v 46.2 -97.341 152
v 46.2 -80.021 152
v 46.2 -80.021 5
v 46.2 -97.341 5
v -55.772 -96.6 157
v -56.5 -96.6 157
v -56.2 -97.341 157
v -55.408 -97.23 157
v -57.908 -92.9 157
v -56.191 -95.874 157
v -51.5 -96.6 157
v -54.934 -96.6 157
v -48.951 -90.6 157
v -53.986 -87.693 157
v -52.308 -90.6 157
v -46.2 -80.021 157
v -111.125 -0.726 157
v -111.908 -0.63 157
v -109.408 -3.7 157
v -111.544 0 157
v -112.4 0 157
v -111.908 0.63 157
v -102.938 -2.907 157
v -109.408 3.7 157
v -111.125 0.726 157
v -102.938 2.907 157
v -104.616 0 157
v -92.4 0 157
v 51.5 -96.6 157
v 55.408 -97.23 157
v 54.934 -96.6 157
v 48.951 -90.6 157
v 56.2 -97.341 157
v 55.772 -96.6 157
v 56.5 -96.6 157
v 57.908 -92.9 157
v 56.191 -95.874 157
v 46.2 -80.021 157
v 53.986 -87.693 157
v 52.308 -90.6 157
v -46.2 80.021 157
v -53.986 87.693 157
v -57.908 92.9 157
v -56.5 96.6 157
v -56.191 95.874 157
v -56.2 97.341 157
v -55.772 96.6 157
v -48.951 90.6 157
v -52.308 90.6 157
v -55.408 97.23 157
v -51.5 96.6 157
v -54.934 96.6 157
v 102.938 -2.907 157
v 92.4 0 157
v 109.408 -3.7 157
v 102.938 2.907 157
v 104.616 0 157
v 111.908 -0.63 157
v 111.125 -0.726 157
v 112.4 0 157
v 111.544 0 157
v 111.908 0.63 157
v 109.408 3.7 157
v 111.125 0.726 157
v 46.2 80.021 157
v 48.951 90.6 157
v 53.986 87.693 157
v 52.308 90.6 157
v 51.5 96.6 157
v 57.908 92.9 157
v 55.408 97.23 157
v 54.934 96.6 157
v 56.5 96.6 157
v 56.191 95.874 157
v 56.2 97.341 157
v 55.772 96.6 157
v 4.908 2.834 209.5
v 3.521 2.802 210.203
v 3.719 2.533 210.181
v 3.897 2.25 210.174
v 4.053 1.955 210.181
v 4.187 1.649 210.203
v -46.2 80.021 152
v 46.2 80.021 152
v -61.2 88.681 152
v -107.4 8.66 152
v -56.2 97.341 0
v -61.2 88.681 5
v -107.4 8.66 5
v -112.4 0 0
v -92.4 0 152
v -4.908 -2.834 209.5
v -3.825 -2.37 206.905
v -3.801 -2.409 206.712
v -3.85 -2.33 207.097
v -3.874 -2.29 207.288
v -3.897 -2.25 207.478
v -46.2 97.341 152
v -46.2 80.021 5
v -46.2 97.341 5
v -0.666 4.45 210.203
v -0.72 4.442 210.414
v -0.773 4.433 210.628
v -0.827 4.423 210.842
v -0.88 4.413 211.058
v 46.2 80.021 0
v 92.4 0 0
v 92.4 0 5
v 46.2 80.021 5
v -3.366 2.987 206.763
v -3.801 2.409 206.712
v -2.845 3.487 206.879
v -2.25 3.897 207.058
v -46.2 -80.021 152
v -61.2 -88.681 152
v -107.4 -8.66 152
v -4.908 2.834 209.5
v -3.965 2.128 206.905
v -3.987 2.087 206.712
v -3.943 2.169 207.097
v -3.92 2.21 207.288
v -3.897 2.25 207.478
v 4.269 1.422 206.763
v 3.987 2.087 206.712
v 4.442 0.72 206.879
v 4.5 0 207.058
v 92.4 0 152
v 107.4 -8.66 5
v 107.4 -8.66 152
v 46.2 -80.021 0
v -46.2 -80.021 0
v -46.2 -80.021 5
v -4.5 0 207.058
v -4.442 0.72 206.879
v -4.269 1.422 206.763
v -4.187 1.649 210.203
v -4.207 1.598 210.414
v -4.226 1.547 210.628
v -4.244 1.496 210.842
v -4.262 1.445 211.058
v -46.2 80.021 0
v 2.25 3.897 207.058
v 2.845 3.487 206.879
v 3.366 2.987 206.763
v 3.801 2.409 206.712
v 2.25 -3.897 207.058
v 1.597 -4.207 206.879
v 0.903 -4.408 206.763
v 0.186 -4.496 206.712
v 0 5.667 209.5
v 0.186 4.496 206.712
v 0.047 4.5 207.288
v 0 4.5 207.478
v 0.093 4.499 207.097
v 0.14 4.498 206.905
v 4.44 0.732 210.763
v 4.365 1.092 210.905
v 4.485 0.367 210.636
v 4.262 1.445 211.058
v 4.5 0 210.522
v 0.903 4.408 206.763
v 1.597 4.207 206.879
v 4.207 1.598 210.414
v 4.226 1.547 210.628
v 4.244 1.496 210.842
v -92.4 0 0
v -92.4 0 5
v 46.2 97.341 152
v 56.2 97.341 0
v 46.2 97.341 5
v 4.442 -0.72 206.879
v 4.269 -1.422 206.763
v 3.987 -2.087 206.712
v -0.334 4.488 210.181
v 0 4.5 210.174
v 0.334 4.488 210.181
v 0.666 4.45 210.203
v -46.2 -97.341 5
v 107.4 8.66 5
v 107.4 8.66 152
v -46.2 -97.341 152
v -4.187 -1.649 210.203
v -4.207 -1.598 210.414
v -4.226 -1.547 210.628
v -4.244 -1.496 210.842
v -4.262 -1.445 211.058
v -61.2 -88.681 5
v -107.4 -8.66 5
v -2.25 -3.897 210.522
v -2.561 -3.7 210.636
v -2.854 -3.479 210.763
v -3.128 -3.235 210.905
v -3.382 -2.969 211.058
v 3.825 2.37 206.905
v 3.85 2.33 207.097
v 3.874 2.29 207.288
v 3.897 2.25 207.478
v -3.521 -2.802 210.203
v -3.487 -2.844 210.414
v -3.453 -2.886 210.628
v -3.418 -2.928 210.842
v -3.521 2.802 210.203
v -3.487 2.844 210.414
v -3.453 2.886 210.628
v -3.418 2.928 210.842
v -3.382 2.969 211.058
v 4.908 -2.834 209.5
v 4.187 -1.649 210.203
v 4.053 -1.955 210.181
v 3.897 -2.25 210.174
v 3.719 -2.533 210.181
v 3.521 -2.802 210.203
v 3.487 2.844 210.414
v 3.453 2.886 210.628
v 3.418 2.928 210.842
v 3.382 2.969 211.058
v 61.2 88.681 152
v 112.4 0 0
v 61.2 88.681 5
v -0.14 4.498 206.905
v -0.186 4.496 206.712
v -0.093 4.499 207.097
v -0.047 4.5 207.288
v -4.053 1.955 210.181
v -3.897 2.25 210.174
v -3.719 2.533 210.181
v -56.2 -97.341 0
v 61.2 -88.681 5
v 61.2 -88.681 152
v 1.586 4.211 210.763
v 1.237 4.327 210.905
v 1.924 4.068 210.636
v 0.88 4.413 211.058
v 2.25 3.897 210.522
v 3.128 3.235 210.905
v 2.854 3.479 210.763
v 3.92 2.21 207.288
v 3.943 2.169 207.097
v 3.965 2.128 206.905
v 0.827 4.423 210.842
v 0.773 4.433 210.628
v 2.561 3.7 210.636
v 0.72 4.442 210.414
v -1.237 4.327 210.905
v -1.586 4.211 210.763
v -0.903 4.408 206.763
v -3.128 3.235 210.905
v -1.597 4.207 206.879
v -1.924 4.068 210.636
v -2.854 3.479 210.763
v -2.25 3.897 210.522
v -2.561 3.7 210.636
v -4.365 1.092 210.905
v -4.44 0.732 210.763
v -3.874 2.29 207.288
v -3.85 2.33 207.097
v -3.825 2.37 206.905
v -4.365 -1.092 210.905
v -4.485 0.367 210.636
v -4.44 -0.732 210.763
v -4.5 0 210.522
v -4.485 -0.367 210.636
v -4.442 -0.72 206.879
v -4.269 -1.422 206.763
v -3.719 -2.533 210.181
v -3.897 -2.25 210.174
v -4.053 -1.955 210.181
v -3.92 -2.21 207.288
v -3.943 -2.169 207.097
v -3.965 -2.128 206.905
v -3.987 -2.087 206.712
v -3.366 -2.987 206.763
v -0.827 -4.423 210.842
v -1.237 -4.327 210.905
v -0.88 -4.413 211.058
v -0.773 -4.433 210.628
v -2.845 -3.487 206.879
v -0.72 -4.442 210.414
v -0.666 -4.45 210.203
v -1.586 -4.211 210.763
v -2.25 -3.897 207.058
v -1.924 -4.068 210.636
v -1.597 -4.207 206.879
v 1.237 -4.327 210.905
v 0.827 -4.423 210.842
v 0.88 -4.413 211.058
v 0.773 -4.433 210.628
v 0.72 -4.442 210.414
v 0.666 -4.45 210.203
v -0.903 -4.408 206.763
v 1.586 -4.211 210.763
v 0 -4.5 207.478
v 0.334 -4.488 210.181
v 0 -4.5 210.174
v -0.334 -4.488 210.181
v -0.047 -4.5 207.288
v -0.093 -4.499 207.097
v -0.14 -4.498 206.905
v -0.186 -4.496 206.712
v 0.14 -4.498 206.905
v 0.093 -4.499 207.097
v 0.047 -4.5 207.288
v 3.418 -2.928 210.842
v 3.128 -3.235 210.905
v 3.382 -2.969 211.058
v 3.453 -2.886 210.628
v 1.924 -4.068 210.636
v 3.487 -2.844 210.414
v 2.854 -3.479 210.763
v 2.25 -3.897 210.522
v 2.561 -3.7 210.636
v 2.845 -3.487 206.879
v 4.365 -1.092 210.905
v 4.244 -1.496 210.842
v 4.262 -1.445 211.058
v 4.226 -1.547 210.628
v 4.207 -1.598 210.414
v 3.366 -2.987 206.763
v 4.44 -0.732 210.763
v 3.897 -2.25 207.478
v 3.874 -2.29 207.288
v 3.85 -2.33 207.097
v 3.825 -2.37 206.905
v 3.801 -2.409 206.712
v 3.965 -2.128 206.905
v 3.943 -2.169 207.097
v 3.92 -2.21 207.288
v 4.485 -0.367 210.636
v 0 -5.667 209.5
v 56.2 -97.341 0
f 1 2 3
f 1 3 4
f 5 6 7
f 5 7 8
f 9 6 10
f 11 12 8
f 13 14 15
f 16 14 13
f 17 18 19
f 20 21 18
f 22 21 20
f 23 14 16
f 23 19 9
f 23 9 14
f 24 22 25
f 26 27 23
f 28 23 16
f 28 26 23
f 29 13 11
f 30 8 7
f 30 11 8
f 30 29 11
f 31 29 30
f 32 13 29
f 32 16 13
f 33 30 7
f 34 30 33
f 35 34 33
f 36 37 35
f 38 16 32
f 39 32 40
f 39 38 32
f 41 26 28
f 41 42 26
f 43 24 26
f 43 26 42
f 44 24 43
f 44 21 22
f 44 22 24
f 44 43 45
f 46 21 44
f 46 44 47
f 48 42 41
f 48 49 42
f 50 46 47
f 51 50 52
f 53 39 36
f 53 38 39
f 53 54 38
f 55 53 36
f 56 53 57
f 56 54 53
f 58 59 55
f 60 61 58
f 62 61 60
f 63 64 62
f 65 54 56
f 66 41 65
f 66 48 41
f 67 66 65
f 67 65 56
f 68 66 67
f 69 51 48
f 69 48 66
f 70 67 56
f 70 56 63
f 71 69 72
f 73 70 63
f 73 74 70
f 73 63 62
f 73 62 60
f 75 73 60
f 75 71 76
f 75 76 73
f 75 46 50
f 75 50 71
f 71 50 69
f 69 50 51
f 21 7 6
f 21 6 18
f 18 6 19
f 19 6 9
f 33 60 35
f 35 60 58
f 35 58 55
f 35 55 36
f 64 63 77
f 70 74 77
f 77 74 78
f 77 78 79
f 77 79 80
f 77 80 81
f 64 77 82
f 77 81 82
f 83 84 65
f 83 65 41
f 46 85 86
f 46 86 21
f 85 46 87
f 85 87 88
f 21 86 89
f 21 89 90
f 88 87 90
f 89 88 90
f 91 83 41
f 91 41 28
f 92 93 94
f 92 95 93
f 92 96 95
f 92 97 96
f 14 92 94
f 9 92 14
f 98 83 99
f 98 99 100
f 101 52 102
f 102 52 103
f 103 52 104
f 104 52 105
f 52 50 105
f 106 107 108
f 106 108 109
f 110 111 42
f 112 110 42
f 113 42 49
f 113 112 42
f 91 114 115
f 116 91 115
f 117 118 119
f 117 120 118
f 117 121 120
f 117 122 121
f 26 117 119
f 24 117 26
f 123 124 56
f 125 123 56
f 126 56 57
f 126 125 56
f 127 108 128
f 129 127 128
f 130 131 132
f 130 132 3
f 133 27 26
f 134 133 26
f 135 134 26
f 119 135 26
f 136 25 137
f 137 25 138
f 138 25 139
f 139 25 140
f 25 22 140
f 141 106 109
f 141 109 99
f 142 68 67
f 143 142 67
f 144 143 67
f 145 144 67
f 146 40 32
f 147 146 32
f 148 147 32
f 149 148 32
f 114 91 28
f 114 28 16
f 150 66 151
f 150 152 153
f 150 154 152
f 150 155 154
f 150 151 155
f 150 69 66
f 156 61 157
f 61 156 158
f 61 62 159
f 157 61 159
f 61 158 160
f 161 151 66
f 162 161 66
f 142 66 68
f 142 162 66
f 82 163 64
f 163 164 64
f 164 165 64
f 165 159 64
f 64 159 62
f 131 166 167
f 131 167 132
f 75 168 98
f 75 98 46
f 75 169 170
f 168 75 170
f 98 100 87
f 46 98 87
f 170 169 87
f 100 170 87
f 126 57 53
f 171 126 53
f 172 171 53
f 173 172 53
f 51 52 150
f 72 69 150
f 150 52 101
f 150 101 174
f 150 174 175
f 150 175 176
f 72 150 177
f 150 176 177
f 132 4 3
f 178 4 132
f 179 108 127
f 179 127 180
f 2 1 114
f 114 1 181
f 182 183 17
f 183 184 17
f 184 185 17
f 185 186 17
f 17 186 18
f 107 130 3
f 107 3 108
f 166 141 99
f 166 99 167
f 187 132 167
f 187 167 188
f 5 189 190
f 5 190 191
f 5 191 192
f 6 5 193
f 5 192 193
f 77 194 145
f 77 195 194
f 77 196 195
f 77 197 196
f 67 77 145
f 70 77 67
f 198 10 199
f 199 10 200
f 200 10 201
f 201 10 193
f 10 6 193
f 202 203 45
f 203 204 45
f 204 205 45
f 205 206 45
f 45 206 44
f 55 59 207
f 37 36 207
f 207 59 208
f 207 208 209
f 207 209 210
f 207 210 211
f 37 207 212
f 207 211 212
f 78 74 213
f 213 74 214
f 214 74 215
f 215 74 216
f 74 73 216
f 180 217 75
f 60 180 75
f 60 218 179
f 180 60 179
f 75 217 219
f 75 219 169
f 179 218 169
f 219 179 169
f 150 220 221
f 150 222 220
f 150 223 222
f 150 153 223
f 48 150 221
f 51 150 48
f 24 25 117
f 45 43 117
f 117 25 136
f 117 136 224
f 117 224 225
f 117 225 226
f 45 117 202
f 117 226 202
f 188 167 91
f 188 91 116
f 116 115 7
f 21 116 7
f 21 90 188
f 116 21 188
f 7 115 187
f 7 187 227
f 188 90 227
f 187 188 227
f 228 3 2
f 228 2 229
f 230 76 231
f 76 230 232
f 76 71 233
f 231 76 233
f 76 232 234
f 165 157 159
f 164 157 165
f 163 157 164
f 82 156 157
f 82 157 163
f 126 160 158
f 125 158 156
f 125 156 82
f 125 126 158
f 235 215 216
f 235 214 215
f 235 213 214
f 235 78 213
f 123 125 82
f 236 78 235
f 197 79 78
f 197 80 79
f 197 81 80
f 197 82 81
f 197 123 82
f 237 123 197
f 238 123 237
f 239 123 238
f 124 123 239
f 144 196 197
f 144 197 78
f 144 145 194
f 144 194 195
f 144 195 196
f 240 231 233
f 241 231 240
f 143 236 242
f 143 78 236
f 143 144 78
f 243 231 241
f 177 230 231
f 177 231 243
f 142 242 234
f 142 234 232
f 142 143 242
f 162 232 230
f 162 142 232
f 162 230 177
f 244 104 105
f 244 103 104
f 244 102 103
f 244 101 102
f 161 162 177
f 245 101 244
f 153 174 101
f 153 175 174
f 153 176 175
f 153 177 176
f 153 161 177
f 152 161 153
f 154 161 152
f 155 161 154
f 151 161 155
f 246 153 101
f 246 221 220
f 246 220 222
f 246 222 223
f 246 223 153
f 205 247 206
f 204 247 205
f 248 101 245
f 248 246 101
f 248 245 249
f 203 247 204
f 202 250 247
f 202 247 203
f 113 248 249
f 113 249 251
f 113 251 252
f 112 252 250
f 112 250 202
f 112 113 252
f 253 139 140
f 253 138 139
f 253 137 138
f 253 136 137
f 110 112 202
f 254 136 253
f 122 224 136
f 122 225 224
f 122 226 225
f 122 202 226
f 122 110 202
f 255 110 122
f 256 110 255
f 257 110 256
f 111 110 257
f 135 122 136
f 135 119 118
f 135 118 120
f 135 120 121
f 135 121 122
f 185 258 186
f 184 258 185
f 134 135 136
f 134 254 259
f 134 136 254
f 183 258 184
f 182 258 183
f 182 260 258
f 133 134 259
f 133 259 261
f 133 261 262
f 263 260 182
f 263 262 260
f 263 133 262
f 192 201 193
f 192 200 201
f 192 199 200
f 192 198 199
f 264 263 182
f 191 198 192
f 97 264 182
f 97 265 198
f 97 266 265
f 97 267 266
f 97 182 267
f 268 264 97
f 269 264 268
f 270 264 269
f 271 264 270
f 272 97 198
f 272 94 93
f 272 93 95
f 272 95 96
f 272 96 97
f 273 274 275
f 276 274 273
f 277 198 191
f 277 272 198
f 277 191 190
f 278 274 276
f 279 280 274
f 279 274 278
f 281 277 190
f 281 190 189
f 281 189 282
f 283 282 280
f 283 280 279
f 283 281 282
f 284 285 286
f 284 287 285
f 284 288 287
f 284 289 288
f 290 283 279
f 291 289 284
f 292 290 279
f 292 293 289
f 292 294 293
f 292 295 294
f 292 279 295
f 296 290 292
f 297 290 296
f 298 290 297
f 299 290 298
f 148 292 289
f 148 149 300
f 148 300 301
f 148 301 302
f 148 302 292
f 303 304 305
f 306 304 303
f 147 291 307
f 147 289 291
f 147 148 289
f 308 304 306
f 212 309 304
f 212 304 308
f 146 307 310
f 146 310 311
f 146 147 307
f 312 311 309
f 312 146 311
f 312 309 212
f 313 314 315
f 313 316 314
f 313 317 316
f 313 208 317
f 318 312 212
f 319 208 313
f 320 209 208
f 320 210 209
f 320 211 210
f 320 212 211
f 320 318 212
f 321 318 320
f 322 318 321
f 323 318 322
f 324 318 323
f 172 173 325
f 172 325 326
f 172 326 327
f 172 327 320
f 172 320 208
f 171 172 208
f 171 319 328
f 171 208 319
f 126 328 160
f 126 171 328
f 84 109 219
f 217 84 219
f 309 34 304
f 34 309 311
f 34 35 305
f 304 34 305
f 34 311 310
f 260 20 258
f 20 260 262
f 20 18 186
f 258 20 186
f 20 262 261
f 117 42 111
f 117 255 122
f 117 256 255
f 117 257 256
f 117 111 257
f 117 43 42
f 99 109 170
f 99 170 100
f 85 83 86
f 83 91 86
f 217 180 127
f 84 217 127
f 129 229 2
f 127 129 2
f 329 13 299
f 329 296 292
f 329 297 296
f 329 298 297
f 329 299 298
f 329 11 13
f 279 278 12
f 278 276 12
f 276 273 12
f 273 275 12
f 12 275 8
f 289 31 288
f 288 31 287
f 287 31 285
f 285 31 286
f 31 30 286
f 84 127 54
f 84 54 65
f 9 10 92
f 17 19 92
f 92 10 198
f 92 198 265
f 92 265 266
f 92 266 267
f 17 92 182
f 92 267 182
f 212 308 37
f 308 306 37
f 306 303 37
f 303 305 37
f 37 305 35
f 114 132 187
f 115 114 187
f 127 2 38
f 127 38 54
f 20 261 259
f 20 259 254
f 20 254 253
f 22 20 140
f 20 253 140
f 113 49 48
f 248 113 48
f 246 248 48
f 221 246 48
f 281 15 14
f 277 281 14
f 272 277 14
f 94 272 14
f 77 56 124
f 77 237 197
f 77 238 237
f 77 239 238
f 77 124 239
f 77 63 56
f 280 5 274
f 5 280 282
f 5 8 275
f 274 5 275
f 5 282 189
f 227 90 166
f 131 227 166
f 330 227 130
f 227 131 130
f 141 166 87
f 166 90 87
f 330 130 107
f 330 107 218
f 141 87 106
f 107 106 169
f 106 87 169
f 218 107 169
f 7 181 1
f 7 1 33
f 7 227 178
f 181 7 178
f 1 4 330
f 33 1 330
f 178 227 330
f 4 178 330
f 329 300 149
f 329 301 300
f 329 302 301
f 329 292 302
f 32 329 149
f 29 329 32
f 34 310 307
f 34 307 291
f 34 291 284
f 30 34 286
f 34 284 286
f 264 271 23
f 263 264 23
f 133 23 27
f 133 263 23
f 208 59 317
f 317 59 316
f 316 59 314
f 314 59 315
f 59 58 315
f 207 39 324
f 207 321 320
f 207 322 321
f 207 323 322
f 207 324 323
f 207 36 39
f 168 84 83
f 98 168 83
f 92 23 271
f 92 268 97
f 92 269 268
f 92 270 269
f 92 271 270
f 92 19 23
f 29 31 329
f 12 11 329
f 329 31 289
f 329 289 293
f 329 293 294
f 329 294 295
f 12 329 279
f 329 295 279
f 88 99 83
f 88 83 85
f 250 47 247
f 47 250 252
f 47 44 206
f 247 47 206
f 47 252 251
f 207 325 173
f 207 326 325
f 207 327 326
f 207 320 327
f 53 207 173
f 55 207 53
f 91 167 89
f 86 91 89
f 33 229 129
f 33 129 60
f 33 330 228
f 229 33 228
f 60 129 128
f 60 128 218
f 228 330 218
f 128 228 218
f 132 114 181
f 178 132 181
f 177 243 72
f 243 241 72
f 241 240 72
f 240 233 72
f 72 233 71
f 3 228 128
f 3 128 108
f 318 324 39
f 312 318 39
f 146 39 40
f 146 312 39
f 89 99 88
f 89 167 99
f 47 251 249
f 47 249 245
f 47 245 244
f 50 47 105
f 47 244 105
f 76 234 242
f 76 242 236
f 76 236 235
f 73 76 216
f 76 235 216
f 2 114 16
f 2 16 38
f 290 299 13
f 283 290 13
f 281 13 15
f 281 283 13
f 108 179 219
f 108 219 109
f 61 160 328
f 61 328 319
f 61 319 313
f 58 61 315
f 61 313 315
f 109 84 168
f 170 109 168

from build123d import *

# Parameters (mm, degrees)
CYLINDER_R                  = 4.5
CYLINDER_DEPTH              = 1000
PAD004_DEPTH                = 3
BODY004_PLACEMENT_ANGLE     = 60
PAD003_DEPTH                = 3
BODY003_PLACEMENT_ANGLE     = 60
PAD006_DEPTH                = 3
BODY006_PLACEMENT_ANGLE     = 60
PAD005_DEPTH                = 3
BODY005_PLACEMENT_ANGLE     = 60
CUT003_PLACEMENT_ANGLE      = 60
PAD008_DEPTH                = 3
BODY008_PLACEMENT_ANGLE     = 60
PAD007_DEPTH                = 3
BODY007_PLACEMENT_ANGLE     = 60
CUT004_PLACEMENT_ANGLE      = 120
PAD010_DEPTH                = 3
BODY010_PLACEMENT_ANGLE     = 60
PAD009_DEPTH                = 3
BODY009_PLACEMENT_ANGLE     = 60
CUT005_PLACEMENT_ANGLE      = 180
PAD012_DEPTH                = 3
BODY012_PLACEMENT_ANGLE     = 60
PAD011_DEPTH                = 3
BODY011_PLACEMENT_ANGLE     = 60
CUT006_PLACEMENT_ANGLE      = 240
PAD014_DEPTH                = 3
BODY014_PLACEMENT_ANGLE     = 60
PAD013_DEPTH                = 3
BODY013_PLACEMENT_ANGLE     = 60
CUT007_PLACEMENT_ANGLE      = 300
BOX_W                       = 92.4
BOX_H                       = 18
BOX_DEPTH                   = 147
BOX001_W                    = 92.4
BOX001_H                    = 18
BOX001_DEPTH                = 147
COMPOUND001_PLACEMENT_ANGLE = 60
BOX002_W                    = 92.4
BOX002_H                    = 18
BOX002_DEPTH                = 147
COMPOUND002_PLACEMENT_ANGLE = 120
BOX003_W                    = 92.4
BOX003_H                    = 18
BOX003_DEPTH                = 147
COMPOUND003_PLACEMENT_ANGLE = 180
BOX004_W                    = 92.4
BOX004_H                    = 18
BOX004_DEPTH                = 147
COMPOUND004_PLACEMENT_ANGLE = 240
BOX005_W                    = 92.4
BOX005_H                    = 18
BOX005_DEPTH                = 147
COMPOUND005_PLACEMENT_ANGLE = 300
PAD001_DEPTH                = 157
PAD_DEPTH                   = 157


with BuildPart() as cylinder:
    # Cylinder → Cylinder (new body)
    with BuildSketch(Plane.XY):
        Circle(CYLINDER_R)
    extrude(amount=CYLINDER_DEPTH)


with BuildPart() as compound007:
    # Sketch004 → Pad004 (new body)
    with BuildSketch(Plane.XZ):
        Polygon((-51.5, 0), (51.5, 0), (0, 105), align=None)
    extrude(amount=PAD004_DEPTH)


with BuildPart() as compound007_1:
    # Body004 placement: moved
    add(compound007.part.moved(Location((0, 96.6, 157))).rotate(Axis((0, 96.6, 157), (1, 0, 0)), BODY004_PLACEMENT_ANGLE))


with BuildPart() as cut002:
    # Sketch003 → Pad003 (new body)
    with BuildSketch(Plane.XZ):
        Polygon((-56.5, 0), (56.5, 0), (0, 115), align=None)
    extrude(amount=PAD003_DEPTH)


with BuildPart() as cut002_1:
    # Body003 placement: moved
    add(cut002.part.moved(Location((0, 96.6, 157))).rotate(Axis((0, 96.6, 157), (1, 0, 0)), BODY003_PLACEMENT_ANGLE))

    # Cut002: cut Compound007
    add(compound007_1.part, mode=Mode.SUBTRACT)


with BuildPart() as compound009:
    # Sketch006 → Pad006 (new body)
    with BuildSketch(Plane.XZ):
        Polygon((-51.5, 0), (51.5, 0), (0, 105), align=None)
    extrude(amount=PAD006_DEPTH)


with BuildPart() as compound009_1:
    # Body006 placement: moved
    add(compound009.part.moved(Location((0, 96.6, 157))).rotate(Axis((0, 96.6, 157), (1, 0, 0)), BODY006_PLACEMENT_ANGLE))


with BuildPart() as cut003:
    # Sketch005 → Pad005 (new body)
    with BuildSketch(Plane.XZ):
        Polygon((-56.5, 0), (56.5, 0), (0, 115), align=None)
    extrude(amount=PAD005_DEPTH)


with BuildPart() as cut003_1:
    # Body005 placement: moved
    add(cut003.part.moved(Location((0, 96.6, 157))).rotate(Axis((0, 96.6, 157), (1, 0, 0)), BODY005_PLACEMENT_ANGLE))

    # Cut003: cut Compound009
    add(compound009_1.part, mode=Mode.SUBTRACT)


with BuildPart() as cut003_2:
    # Cut003 placement: moved
    add(cut003_1.part.rotate(Axis((0, 0, 0), (0, 0, 1)), CUT003_PLACEMENT_ANGLE))


with BuildPart() as compound011:
    # Sketch008 → Pad008 (new body)
    with BuildSketch(Plane.XZ):
        Polygon((-51.5, 0), (51.5, 0), (0, 105), align=None)
    extrude(amount=PAD008_DEPTH)


with BuildPart() as compound011_1:
    # Body008 placement: moved
    add(compound011.part.moved(Location((0, 96.6, 157))).rotate(Axis((0, 96.6, 157), (1, 0, 0)), BODY008_PLACEMENT_ANGLE))


with BuildPart() as cut004:
    # Sketch007 → Pad007 (new body)
    with BuildSketch(Plane.XZ):
        Polygon((-56.5, 0), (56.5, 0), (0, 115), align=None)
    extrude(amount=PAD007_DEPTH)


with BuildPart() as cut004_1:
    # Body007 placement: moved
    add(cut004.part.moved(Location((0, 96.6, 157))).rotate(Axis((0, 96.6, 157), (1, 0, 0)), BODY007_PLACEMENT_ANGLE))

    # Cut004: cut Compound011
    add(compound011_1.part, mode=Mode.SUBTRACT)


with BuildPart() as cut004_2:
    # Cut004 placement: moved
    add(cut004_1.part.rotate(Axis((0, 0, 0), (0, 0, 1)), CUT004_PLACEMENT_ANGLE))


with BuildPart() as compound013:
    # Sketch010 → Pad010 (new body)
    with BuildSketch(Plane.XZ):
        Polygon((-51.5, 0), (51.5, 0), (0, 105), align=None)
    extrude(amount=PAD010_DEPTH)


with BuildPart() as compound013_1:
    # Body010 placement: moved
    add(compound013.part.moved(Location((0, 96.6, 157))).rotate(Axis((0, 96.6, 157), (1, 0, 0)), BODY010_PLACEMENT_ANGLE))


with BuildPart() as cut005:
    # Sketch009 → Pad009 (new body)
    with BuildSketch(Plane.XZ):
        Polygon((-56.5, 0), (56.5, 0), (0, 115), align=None)
    extrude(amount=PAD009_DEPTH)


with BuildPart() as cut005_1:
    # Body009 placement: moved
    add(cut005.part.moved(Location((0, 96.6, 157))).rotate(Axis((0, 96.6, 157), (1, 0, 0)), BODY009_PLACEMENT_ANGLE))

    # Cut005: cut Compound013
    add(compound013_1.part, mode=Mode.SUBTRACT)


with BuildPart() as cut005_2:
    # Cut005 placement: moved
    add(cut005_1.part.rotate(Axis((0, 0, 0), (0, 0, 1)), CUT005_PLACEMENT_ANGLE))


with BuildPart() as compound015:
    # Sketch012 → Pad012 (new body)
    with BuildSketch(Plane.XZ):
        Polygon((-51.5, 0), (51.5, 0), (0, 105), align=None)
    extrude(amount=PAD012_DEPTH)


with BuildPart() as compound015_1:
    # Body012 placement: moved
    add(compound015.part.moved(Location((0, 96.6, 157))).rotate(Axis((0, 96.6, 157), (1, 0, 0)), BODY012_PLACEMENT_ANGLE))


with BuildPart() as cut006:
    # Sketch011 → Pad011 (new body)
    with BuildSketch(Plane.XZ):
        Polygon((-56.5, 0), (56.5, 0), (0, 115), align=None)
    extrude(amount=PAD011_DEPTH)


with BuildPart() as cut006_1:
    # Body011 placement: moved
    add(cut006.part.moved(Location((0, 96.6, 157))).rotate(Axis((0, 96.6, 157), (1, 0, 0)), BODY011_PLACEMENT_ANGLE))

    # Cut006: cut Compound015
    add(compound015_1.part, mode=Mode.SUBTRACT)


with BuildPart() as cut006_2:
    # Cut006 placement: moved
    add(cut006_1.part.rotate(Axis((0, 0, 0), (0, 0, 1)), CUT006_PLACEMENT_ANGLE))


with BuildPart() as compound017:
    # Sketch014 → Pad014 (new body)
    with BuildSketch(Plane.XZ):
        Polygon((-51.5, 0), (51.5, 0), (0, 105), align=None)
    extrude(amount=PAD014_DEPTH)


with BuildPart() as compound017_1:
    # Body014 placement: moved
    add(compound017.part.moved(Location((0, 96.6, 157))).rotate(Axis((0, 96.6, 157), (1, 0, 0)), BODY014_PLACEMENT_ANGLE))


with BuildPart() as cut008:
    # Sketch013 → Pad013 (new body)
    with BuildSketch(Plane.XZ):
        Polygon((-56.5, 0), (56.5, 0), (0, 115), align=None)
    extrude(amount=PAD013_DEPTH)


with BuildPart() as cut008_1:
    # Body013 placement: moved
    add(cut008.part.moved(Location((0, 96.6, 157))).rotate(Axis((0, 96.6, 157), (1, 0, 0)), BODY013_PLACEMENT_ANGLE))

    # Cut007: cut Compound017
    add(compound017_1.part, mode=Mode.SUBTRACT)


with BuildPart() as cut008_2:
    # Cut007 placement: moved
    add(cut008_1.part.rotate(Axis((0, 0, 0), (0, 0, 1)), CUT007_PLACEMENT_ANGLE))

    # Fusion001: union Cut002, Cut003, Cut004, Cut005, Cut006
    add(cut002_1.part)
    add(cut003_2.part)
    add(cut004_2.part)
    add(cut005_2.part)
    add(cut006_2.part)

    # Cut008: cut Cylinder
    add(cylinder.part, mode=Mode.SUBTRACT)


with BuildPart() as compound:
    # Box → Box (new body)
    with BuildSketch(Plane(origin=(-46.2, 80, 5), x_dir=(1, 0, 0), z_dir=(0, 0, 1))):
        with Locations((46.2, 9)):
            Rectangle(BOX_W, BOX_H)
    extrude(amount=BOX_DEPTH)


with BuildPart() as compound001:
    # Box001 → Box001 (new body)
    with BuildSketch(Plane(origin=(-46.2, 80, 5), x_dir=(1, 0, 0), z_dir=(0, 0, 1))):
        with Locations((46.2, 9)):
            Rectangle(BOX001_W, BOX001_H)
    extrude(amount=BOX001_DEPTH)


with BuildPart() as compound001_1:
    # Compound001 placement: moved
    add(compound001.part.rotate(Axis((0, 0, 0), (0, 0, 1)), COMPOUND001_PLACEMENT_ANGLE))


with BuildPart() as compound002:
    # Box002 → Box002 (new body)
    with BuildSketch(Plane(origin=(-46.2, 80, 5), x_dir=(1, 0, 0), z_dir=(0, 0, 1))):
        with Locations((46.2, 9)):
            Rectangle(BOX002_W, BOX002_H)
    extrude(amount=BOX002_DEPTH)


with BuildPart() as compound002_1:
    # Compound002 placement: moved
    add(compound002.part.rotate(Axis((0, 0, 0), (0, 0, 1)), COMPOUND002_PLACEMENT_ANGLE))


with BuildPart() as compound003:
    # Box003 → Box003 (new body)
    with BuildSketch(Plane(origin=(-46.2, 80, 5), x_dir=(1, 0, 0), z_dir=(0, 0, 1))):
        with Locations((46.2, 9)):
            Rectangle(BOX003_W, BOX003_H)
    extrude(amount=BOX003_DEPTH)


with BuildPart() as compound003_1:
    # Compound003 placement: moved
    add(compound003.part.rotate(Axis((0, 0, 0), (0, 0, 1)), COMPOUND003_PLACEMENT_ANGLE))


with BuildPart() as compound004:
    # Box004 → Box004 (new body)
    with BuildSketch(Plane(origin=(-46.2, 80, 5), x_dir=(1, 0, 0), z_dir=(0, 0, 1))):
        with Locations((46.2, 9)):
            Rectangle(BOX004_W, BOX004_H)
    extrude(amount=BOX004_DEPTH)


with BuildPart() as compound004_1:
    # Compound004 placement: moved
    add(compound004.part.rotate(Axis((0, 0, 0), (0, 0, 1)), COMPOUND004_PLACEMENT_ANGLE))


with BuildPart() as fusion:
    # Box005 → Box005 (new body)
    with BuildSketch(Plane(origin=(-46.2, 80, 5), x_dir=(1, 0, 0), z_dir=(0, 0, 1))):
        with Locations((46.2, 9)):
            Rectangle(BOX005_W, BOX005_H)
    extrude(amount=BOX005_DEPTH)


with BuildPart() as fusion_1:
    # Compound005 placement: moved
    add(fusion.part.rotate(Axis((0, 0, 0), (0, 0, 1)), COMPOUND005_PLACEMENT_ANGLE))

    # Fusion: union Compound, Compound001, Compound002, Compound003, Compound004
    add(compound.part)
    add(compound001_1.part)
    add(compound002_1.part)
    add(compound003_1.part)
    add(compound004_1.part)


with BuildPart() as body001:
    # Sketch001 → Pad001 (new body)
    with BuildSketch(Plane.XY):
        Polygon((92.4, 0), (46.2, 80.020747), (-46.2, 80.020747), (-92.4, 0), (-46.2, -80.020747), (46.2, -80.020747), align=None)
    extrude(amount=PAD001_DEPTH)


with BuildPart() as fusion002:
    # Sketch → Pad (new body)
    with BuildSketch(Plane.XY):
        Polygon((112.4, 0), (56.2, 97.341255), (-56.2, 97.341255), (-112.4, 0), (-56.2, -97.341255), (56.2, -97.341255), align=None)
    extrude(amount=PAD_DEPTH)

    # Cut: cut Body001
    add(body001.part, mode=Mode.SUBTRACT)

    # Cut001: cut Fusion
    add(fusion_1.part, mode=Mode.SUBTRACT)

    # Fusion002: union Cut008
    add(cut008_2.part)


solid = fusion002.part
